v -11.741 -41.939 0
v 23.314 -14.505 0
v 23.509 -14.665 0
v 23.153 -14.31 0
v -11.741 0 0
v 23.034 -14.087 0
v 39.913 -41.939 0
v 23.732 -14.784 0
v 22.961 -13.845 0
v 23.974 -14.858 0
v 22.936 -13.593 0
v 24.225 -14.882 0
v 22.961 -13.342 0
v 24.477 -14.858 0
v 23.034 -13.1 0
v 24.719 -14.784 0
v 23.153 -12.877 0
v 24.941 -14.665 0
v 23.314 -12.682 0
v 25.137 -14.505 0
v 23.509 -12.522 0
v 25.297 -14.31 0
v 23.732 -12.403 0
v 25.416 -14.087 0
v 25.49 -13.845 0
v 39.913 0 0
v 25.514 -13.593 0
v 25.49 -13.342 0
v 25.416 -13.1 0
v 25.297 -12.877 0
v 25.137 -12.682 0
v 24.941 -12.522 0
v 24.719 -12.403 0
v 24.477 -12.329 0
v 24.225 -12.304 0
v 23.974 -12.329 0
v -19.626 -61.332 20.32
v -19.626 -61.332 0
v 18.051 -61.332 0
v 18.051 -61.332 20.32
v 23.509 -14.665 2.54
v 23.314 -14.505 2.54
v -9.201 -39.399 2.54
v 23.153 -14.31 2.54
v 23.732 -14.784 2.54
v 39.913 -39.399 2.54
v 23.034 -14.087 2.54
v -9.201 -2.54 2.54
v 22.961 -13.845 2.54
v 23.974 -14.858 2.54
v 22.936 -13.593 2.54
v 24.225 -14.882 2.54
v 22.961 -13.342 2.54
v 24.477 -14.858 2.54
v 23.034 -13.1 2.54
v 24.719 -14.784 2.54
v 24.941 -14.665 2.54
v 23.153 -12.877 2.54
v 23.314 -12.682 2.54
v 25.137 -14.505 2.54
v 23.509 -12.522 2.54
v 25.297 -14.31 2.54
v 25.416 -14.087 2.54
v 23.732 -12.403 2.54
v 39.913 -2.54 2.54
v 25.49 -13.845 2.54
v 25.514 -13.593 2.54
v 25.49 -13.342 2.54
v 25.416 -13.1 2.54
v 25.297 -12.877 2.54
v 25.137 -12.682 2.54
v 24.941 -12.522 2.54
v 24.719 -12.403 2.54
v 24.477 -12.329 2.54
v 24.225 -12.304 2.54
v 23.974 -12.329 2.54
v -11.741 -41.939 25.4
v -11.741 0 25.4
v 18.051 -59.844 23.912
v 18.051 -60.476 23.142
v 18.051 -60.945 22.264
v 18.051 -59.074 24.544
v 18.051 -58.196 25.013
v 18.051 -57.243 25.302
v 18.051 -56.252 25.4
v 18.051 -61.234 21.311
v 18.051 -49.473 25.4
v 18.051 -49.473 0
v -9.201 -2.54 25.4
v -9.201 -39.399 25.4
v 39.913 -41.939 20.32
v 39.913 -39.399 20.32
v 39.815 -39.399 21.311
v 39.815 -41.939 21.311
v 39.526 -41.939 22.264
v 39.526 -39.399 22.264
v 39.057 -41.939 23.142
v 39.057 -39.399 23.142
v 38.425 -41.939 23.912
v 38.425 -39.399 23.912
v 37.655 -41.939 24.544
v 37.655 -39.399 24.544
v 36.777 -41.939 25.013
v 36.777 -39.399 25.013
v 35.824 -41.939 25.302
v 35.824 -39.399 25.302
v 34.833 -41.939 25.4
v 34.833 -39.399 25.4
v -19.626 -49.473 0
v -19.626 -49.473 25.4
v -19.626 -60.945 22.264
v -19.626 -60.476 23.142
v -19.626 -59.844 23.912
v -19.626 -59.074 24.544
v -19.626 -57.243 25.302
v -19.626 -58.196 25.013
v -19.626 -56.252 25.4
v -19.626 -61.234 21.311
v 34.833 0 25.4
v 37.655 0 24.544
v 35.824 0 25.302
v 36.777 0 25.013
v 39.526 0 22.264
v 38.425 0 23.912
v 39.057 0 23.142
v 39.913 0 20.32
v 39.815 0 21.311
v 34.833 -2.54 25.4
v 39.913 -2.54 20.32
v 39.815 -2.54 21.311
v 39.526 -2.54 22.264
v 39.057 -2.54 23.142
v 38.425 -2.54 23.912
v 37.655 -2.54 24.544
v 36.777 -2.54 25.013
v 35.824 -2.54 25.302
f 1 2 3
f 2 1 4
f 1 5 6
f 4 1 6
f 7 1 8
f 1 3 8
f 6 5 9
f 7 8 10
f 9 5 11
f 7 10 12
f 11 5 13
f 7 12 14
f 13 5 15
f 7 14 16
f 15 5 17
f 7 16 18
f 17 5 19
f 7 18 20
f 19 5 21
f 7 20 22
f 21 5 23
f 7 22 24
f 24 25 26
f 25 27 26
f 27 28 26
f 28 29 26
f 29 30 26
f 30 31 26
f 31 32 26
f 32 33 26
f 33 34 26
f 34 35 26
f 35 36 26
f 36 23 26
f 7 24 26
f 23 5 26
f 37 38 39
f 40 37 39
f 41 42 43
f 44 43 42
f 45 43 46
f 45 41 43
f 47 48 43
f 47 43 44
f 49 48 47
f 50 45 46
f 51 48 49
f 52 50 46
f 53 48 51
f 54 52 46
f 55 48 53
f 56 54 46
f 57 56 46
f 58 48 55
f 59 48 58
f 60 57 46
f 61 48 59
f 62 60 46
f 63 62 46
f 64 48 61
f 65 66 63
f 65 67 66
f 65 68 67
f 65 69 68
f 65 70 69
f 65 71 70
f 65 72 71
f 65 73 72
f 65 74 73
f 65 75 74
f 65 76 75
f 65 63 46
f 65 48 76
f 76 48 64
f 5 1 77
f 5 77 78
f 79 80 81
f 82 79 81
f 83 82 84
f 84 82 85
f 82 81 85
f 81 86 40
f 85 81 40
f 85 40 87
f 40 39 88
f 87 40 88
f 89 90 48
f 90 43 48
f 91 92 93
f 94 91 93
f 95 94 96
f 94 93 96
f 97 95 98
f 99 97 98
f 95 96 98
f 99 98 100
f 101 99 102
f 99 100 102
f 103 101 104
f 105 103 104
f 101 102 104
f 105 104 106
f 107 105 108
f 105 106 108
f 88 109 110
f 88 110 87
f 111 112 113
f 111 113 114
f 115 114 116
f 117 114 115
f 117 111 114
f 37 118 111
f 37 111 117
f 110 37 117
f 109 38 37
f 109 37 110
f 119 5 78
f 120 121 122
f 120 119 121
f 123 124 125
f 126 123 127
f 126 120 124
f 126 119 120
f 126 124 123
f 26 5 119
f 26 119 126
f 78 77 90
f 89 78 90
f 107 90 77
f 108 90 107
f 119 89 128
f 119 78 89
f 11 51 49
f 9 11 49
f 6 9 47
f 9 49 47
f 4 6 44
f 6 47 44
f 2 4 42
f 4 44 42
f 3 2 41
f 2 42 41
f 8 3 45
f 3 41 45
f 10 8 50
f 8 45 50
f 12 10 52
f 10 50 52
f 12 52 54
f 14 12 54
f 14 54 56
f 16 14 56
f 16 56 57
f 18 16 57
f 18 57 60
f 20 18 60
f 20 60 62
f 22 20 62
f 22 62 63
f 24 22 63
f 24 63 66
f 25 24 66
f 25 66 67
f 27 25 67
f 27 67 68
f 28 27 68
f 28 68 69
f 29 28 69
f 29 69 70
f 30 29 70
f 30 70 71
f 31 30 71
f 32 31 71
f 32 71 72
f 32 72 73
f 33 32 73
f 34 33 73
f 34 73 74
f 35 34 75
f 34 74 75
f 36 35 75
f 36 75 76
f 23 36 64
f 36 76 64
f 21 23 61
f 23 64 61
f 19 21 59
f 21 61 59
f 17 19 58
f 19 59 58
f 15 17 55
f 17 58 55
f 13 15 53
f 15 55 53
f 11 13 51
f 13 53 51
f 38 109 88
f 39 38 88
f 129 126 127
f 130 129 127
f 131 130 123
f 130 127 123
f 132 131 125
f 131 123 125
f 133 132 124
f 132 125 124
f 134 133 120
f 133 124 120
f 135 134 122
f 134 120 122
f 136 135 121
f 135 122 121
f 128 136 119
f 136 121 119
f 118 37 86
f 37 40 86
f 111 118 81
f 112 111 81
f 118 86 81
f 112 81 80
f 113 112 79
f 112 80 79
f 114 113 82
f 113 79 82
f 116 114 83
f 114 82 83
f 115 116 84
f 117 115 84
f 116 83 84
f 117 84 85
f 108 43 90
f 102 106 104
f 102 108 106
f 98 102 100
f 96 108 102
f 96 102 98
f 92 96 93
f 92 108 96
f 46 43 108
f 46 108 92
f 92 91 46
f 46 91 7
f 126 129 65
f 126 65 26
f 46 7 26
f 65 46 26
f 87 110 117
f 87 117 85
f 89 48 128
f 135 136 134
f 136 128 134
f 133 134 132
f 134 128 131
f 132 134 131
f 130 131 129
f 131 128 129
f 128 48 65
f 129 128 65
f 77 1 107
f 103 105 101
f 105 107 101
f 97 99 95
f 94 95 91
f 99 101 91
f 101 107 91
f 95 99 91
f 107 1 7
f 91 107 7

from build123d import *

# Parameters (mm, degrees)
F0_W     = 51.6543779522
F0_H     = 41.938520968
F1_DEPTH = 25.4
F0_W_2   = 37.6770738512
F0_H_2   = 11.8587054312
F2_R     = 5.08
F2_2_R   = 5.08
F3_T     = -2.54
F5_D     = 2.5781


with BuildPart() as f1:
    # F0 (on Top) → F1 (new body)
    with BuildSketch(Plane.XY):
        with Locations((14.0857463703, -20.969260484)):
            Rectangle(F0_W, F0_H)
    extrude(amount=F1_DEPTH)

    # F2#2
    f2_2_edges = [f1.edges().sort_by_distance(p)[0] for p in [
        (39.912935, -20.96926, 25.4),
    ]]
    fillet(f2_2_edges, radius=F2_2_R)

    # F3
    f3_openings = [f1.faces().sort_by_distance(p)[0] for p in [
        (11.545746, -20.96926, 25.4),
        (38.425038, -20.96926, 23.912102),
        (39.912935, -20.96926, 10.16),
    ]]
    offset(amount=F3_T, openings=f3_openings)

    # F5 (through all)
    with Locations(Plane(origin=(0, 0, 0), x_dir=(1, 0, 0), z_dir=(0, 0, -1))):
        with Locations((24.2253057659, 13.5934464633)):
            Hole(F5_D / 2)


with BuildPart() as f1b:
    # F0 (on Top) → F1, piece 2 (new body)
    with BuildSketch(Plane.XY):
        with Locations((-0.7876539603, -55.4026570171)):
            Rectangle(F0_W_2, F0_H_2)
    extrude(amount=F1_DEPTH)

    # F2
    f2_edges = [f1b.edges().sort_by_distance(p)[0] for p in [
        (-0.787654, -61.33201, 25.4),
    ]]
    fillet(f2_edges, radius=F2_R)


solid = Compound([f1.part, f1b.part])
